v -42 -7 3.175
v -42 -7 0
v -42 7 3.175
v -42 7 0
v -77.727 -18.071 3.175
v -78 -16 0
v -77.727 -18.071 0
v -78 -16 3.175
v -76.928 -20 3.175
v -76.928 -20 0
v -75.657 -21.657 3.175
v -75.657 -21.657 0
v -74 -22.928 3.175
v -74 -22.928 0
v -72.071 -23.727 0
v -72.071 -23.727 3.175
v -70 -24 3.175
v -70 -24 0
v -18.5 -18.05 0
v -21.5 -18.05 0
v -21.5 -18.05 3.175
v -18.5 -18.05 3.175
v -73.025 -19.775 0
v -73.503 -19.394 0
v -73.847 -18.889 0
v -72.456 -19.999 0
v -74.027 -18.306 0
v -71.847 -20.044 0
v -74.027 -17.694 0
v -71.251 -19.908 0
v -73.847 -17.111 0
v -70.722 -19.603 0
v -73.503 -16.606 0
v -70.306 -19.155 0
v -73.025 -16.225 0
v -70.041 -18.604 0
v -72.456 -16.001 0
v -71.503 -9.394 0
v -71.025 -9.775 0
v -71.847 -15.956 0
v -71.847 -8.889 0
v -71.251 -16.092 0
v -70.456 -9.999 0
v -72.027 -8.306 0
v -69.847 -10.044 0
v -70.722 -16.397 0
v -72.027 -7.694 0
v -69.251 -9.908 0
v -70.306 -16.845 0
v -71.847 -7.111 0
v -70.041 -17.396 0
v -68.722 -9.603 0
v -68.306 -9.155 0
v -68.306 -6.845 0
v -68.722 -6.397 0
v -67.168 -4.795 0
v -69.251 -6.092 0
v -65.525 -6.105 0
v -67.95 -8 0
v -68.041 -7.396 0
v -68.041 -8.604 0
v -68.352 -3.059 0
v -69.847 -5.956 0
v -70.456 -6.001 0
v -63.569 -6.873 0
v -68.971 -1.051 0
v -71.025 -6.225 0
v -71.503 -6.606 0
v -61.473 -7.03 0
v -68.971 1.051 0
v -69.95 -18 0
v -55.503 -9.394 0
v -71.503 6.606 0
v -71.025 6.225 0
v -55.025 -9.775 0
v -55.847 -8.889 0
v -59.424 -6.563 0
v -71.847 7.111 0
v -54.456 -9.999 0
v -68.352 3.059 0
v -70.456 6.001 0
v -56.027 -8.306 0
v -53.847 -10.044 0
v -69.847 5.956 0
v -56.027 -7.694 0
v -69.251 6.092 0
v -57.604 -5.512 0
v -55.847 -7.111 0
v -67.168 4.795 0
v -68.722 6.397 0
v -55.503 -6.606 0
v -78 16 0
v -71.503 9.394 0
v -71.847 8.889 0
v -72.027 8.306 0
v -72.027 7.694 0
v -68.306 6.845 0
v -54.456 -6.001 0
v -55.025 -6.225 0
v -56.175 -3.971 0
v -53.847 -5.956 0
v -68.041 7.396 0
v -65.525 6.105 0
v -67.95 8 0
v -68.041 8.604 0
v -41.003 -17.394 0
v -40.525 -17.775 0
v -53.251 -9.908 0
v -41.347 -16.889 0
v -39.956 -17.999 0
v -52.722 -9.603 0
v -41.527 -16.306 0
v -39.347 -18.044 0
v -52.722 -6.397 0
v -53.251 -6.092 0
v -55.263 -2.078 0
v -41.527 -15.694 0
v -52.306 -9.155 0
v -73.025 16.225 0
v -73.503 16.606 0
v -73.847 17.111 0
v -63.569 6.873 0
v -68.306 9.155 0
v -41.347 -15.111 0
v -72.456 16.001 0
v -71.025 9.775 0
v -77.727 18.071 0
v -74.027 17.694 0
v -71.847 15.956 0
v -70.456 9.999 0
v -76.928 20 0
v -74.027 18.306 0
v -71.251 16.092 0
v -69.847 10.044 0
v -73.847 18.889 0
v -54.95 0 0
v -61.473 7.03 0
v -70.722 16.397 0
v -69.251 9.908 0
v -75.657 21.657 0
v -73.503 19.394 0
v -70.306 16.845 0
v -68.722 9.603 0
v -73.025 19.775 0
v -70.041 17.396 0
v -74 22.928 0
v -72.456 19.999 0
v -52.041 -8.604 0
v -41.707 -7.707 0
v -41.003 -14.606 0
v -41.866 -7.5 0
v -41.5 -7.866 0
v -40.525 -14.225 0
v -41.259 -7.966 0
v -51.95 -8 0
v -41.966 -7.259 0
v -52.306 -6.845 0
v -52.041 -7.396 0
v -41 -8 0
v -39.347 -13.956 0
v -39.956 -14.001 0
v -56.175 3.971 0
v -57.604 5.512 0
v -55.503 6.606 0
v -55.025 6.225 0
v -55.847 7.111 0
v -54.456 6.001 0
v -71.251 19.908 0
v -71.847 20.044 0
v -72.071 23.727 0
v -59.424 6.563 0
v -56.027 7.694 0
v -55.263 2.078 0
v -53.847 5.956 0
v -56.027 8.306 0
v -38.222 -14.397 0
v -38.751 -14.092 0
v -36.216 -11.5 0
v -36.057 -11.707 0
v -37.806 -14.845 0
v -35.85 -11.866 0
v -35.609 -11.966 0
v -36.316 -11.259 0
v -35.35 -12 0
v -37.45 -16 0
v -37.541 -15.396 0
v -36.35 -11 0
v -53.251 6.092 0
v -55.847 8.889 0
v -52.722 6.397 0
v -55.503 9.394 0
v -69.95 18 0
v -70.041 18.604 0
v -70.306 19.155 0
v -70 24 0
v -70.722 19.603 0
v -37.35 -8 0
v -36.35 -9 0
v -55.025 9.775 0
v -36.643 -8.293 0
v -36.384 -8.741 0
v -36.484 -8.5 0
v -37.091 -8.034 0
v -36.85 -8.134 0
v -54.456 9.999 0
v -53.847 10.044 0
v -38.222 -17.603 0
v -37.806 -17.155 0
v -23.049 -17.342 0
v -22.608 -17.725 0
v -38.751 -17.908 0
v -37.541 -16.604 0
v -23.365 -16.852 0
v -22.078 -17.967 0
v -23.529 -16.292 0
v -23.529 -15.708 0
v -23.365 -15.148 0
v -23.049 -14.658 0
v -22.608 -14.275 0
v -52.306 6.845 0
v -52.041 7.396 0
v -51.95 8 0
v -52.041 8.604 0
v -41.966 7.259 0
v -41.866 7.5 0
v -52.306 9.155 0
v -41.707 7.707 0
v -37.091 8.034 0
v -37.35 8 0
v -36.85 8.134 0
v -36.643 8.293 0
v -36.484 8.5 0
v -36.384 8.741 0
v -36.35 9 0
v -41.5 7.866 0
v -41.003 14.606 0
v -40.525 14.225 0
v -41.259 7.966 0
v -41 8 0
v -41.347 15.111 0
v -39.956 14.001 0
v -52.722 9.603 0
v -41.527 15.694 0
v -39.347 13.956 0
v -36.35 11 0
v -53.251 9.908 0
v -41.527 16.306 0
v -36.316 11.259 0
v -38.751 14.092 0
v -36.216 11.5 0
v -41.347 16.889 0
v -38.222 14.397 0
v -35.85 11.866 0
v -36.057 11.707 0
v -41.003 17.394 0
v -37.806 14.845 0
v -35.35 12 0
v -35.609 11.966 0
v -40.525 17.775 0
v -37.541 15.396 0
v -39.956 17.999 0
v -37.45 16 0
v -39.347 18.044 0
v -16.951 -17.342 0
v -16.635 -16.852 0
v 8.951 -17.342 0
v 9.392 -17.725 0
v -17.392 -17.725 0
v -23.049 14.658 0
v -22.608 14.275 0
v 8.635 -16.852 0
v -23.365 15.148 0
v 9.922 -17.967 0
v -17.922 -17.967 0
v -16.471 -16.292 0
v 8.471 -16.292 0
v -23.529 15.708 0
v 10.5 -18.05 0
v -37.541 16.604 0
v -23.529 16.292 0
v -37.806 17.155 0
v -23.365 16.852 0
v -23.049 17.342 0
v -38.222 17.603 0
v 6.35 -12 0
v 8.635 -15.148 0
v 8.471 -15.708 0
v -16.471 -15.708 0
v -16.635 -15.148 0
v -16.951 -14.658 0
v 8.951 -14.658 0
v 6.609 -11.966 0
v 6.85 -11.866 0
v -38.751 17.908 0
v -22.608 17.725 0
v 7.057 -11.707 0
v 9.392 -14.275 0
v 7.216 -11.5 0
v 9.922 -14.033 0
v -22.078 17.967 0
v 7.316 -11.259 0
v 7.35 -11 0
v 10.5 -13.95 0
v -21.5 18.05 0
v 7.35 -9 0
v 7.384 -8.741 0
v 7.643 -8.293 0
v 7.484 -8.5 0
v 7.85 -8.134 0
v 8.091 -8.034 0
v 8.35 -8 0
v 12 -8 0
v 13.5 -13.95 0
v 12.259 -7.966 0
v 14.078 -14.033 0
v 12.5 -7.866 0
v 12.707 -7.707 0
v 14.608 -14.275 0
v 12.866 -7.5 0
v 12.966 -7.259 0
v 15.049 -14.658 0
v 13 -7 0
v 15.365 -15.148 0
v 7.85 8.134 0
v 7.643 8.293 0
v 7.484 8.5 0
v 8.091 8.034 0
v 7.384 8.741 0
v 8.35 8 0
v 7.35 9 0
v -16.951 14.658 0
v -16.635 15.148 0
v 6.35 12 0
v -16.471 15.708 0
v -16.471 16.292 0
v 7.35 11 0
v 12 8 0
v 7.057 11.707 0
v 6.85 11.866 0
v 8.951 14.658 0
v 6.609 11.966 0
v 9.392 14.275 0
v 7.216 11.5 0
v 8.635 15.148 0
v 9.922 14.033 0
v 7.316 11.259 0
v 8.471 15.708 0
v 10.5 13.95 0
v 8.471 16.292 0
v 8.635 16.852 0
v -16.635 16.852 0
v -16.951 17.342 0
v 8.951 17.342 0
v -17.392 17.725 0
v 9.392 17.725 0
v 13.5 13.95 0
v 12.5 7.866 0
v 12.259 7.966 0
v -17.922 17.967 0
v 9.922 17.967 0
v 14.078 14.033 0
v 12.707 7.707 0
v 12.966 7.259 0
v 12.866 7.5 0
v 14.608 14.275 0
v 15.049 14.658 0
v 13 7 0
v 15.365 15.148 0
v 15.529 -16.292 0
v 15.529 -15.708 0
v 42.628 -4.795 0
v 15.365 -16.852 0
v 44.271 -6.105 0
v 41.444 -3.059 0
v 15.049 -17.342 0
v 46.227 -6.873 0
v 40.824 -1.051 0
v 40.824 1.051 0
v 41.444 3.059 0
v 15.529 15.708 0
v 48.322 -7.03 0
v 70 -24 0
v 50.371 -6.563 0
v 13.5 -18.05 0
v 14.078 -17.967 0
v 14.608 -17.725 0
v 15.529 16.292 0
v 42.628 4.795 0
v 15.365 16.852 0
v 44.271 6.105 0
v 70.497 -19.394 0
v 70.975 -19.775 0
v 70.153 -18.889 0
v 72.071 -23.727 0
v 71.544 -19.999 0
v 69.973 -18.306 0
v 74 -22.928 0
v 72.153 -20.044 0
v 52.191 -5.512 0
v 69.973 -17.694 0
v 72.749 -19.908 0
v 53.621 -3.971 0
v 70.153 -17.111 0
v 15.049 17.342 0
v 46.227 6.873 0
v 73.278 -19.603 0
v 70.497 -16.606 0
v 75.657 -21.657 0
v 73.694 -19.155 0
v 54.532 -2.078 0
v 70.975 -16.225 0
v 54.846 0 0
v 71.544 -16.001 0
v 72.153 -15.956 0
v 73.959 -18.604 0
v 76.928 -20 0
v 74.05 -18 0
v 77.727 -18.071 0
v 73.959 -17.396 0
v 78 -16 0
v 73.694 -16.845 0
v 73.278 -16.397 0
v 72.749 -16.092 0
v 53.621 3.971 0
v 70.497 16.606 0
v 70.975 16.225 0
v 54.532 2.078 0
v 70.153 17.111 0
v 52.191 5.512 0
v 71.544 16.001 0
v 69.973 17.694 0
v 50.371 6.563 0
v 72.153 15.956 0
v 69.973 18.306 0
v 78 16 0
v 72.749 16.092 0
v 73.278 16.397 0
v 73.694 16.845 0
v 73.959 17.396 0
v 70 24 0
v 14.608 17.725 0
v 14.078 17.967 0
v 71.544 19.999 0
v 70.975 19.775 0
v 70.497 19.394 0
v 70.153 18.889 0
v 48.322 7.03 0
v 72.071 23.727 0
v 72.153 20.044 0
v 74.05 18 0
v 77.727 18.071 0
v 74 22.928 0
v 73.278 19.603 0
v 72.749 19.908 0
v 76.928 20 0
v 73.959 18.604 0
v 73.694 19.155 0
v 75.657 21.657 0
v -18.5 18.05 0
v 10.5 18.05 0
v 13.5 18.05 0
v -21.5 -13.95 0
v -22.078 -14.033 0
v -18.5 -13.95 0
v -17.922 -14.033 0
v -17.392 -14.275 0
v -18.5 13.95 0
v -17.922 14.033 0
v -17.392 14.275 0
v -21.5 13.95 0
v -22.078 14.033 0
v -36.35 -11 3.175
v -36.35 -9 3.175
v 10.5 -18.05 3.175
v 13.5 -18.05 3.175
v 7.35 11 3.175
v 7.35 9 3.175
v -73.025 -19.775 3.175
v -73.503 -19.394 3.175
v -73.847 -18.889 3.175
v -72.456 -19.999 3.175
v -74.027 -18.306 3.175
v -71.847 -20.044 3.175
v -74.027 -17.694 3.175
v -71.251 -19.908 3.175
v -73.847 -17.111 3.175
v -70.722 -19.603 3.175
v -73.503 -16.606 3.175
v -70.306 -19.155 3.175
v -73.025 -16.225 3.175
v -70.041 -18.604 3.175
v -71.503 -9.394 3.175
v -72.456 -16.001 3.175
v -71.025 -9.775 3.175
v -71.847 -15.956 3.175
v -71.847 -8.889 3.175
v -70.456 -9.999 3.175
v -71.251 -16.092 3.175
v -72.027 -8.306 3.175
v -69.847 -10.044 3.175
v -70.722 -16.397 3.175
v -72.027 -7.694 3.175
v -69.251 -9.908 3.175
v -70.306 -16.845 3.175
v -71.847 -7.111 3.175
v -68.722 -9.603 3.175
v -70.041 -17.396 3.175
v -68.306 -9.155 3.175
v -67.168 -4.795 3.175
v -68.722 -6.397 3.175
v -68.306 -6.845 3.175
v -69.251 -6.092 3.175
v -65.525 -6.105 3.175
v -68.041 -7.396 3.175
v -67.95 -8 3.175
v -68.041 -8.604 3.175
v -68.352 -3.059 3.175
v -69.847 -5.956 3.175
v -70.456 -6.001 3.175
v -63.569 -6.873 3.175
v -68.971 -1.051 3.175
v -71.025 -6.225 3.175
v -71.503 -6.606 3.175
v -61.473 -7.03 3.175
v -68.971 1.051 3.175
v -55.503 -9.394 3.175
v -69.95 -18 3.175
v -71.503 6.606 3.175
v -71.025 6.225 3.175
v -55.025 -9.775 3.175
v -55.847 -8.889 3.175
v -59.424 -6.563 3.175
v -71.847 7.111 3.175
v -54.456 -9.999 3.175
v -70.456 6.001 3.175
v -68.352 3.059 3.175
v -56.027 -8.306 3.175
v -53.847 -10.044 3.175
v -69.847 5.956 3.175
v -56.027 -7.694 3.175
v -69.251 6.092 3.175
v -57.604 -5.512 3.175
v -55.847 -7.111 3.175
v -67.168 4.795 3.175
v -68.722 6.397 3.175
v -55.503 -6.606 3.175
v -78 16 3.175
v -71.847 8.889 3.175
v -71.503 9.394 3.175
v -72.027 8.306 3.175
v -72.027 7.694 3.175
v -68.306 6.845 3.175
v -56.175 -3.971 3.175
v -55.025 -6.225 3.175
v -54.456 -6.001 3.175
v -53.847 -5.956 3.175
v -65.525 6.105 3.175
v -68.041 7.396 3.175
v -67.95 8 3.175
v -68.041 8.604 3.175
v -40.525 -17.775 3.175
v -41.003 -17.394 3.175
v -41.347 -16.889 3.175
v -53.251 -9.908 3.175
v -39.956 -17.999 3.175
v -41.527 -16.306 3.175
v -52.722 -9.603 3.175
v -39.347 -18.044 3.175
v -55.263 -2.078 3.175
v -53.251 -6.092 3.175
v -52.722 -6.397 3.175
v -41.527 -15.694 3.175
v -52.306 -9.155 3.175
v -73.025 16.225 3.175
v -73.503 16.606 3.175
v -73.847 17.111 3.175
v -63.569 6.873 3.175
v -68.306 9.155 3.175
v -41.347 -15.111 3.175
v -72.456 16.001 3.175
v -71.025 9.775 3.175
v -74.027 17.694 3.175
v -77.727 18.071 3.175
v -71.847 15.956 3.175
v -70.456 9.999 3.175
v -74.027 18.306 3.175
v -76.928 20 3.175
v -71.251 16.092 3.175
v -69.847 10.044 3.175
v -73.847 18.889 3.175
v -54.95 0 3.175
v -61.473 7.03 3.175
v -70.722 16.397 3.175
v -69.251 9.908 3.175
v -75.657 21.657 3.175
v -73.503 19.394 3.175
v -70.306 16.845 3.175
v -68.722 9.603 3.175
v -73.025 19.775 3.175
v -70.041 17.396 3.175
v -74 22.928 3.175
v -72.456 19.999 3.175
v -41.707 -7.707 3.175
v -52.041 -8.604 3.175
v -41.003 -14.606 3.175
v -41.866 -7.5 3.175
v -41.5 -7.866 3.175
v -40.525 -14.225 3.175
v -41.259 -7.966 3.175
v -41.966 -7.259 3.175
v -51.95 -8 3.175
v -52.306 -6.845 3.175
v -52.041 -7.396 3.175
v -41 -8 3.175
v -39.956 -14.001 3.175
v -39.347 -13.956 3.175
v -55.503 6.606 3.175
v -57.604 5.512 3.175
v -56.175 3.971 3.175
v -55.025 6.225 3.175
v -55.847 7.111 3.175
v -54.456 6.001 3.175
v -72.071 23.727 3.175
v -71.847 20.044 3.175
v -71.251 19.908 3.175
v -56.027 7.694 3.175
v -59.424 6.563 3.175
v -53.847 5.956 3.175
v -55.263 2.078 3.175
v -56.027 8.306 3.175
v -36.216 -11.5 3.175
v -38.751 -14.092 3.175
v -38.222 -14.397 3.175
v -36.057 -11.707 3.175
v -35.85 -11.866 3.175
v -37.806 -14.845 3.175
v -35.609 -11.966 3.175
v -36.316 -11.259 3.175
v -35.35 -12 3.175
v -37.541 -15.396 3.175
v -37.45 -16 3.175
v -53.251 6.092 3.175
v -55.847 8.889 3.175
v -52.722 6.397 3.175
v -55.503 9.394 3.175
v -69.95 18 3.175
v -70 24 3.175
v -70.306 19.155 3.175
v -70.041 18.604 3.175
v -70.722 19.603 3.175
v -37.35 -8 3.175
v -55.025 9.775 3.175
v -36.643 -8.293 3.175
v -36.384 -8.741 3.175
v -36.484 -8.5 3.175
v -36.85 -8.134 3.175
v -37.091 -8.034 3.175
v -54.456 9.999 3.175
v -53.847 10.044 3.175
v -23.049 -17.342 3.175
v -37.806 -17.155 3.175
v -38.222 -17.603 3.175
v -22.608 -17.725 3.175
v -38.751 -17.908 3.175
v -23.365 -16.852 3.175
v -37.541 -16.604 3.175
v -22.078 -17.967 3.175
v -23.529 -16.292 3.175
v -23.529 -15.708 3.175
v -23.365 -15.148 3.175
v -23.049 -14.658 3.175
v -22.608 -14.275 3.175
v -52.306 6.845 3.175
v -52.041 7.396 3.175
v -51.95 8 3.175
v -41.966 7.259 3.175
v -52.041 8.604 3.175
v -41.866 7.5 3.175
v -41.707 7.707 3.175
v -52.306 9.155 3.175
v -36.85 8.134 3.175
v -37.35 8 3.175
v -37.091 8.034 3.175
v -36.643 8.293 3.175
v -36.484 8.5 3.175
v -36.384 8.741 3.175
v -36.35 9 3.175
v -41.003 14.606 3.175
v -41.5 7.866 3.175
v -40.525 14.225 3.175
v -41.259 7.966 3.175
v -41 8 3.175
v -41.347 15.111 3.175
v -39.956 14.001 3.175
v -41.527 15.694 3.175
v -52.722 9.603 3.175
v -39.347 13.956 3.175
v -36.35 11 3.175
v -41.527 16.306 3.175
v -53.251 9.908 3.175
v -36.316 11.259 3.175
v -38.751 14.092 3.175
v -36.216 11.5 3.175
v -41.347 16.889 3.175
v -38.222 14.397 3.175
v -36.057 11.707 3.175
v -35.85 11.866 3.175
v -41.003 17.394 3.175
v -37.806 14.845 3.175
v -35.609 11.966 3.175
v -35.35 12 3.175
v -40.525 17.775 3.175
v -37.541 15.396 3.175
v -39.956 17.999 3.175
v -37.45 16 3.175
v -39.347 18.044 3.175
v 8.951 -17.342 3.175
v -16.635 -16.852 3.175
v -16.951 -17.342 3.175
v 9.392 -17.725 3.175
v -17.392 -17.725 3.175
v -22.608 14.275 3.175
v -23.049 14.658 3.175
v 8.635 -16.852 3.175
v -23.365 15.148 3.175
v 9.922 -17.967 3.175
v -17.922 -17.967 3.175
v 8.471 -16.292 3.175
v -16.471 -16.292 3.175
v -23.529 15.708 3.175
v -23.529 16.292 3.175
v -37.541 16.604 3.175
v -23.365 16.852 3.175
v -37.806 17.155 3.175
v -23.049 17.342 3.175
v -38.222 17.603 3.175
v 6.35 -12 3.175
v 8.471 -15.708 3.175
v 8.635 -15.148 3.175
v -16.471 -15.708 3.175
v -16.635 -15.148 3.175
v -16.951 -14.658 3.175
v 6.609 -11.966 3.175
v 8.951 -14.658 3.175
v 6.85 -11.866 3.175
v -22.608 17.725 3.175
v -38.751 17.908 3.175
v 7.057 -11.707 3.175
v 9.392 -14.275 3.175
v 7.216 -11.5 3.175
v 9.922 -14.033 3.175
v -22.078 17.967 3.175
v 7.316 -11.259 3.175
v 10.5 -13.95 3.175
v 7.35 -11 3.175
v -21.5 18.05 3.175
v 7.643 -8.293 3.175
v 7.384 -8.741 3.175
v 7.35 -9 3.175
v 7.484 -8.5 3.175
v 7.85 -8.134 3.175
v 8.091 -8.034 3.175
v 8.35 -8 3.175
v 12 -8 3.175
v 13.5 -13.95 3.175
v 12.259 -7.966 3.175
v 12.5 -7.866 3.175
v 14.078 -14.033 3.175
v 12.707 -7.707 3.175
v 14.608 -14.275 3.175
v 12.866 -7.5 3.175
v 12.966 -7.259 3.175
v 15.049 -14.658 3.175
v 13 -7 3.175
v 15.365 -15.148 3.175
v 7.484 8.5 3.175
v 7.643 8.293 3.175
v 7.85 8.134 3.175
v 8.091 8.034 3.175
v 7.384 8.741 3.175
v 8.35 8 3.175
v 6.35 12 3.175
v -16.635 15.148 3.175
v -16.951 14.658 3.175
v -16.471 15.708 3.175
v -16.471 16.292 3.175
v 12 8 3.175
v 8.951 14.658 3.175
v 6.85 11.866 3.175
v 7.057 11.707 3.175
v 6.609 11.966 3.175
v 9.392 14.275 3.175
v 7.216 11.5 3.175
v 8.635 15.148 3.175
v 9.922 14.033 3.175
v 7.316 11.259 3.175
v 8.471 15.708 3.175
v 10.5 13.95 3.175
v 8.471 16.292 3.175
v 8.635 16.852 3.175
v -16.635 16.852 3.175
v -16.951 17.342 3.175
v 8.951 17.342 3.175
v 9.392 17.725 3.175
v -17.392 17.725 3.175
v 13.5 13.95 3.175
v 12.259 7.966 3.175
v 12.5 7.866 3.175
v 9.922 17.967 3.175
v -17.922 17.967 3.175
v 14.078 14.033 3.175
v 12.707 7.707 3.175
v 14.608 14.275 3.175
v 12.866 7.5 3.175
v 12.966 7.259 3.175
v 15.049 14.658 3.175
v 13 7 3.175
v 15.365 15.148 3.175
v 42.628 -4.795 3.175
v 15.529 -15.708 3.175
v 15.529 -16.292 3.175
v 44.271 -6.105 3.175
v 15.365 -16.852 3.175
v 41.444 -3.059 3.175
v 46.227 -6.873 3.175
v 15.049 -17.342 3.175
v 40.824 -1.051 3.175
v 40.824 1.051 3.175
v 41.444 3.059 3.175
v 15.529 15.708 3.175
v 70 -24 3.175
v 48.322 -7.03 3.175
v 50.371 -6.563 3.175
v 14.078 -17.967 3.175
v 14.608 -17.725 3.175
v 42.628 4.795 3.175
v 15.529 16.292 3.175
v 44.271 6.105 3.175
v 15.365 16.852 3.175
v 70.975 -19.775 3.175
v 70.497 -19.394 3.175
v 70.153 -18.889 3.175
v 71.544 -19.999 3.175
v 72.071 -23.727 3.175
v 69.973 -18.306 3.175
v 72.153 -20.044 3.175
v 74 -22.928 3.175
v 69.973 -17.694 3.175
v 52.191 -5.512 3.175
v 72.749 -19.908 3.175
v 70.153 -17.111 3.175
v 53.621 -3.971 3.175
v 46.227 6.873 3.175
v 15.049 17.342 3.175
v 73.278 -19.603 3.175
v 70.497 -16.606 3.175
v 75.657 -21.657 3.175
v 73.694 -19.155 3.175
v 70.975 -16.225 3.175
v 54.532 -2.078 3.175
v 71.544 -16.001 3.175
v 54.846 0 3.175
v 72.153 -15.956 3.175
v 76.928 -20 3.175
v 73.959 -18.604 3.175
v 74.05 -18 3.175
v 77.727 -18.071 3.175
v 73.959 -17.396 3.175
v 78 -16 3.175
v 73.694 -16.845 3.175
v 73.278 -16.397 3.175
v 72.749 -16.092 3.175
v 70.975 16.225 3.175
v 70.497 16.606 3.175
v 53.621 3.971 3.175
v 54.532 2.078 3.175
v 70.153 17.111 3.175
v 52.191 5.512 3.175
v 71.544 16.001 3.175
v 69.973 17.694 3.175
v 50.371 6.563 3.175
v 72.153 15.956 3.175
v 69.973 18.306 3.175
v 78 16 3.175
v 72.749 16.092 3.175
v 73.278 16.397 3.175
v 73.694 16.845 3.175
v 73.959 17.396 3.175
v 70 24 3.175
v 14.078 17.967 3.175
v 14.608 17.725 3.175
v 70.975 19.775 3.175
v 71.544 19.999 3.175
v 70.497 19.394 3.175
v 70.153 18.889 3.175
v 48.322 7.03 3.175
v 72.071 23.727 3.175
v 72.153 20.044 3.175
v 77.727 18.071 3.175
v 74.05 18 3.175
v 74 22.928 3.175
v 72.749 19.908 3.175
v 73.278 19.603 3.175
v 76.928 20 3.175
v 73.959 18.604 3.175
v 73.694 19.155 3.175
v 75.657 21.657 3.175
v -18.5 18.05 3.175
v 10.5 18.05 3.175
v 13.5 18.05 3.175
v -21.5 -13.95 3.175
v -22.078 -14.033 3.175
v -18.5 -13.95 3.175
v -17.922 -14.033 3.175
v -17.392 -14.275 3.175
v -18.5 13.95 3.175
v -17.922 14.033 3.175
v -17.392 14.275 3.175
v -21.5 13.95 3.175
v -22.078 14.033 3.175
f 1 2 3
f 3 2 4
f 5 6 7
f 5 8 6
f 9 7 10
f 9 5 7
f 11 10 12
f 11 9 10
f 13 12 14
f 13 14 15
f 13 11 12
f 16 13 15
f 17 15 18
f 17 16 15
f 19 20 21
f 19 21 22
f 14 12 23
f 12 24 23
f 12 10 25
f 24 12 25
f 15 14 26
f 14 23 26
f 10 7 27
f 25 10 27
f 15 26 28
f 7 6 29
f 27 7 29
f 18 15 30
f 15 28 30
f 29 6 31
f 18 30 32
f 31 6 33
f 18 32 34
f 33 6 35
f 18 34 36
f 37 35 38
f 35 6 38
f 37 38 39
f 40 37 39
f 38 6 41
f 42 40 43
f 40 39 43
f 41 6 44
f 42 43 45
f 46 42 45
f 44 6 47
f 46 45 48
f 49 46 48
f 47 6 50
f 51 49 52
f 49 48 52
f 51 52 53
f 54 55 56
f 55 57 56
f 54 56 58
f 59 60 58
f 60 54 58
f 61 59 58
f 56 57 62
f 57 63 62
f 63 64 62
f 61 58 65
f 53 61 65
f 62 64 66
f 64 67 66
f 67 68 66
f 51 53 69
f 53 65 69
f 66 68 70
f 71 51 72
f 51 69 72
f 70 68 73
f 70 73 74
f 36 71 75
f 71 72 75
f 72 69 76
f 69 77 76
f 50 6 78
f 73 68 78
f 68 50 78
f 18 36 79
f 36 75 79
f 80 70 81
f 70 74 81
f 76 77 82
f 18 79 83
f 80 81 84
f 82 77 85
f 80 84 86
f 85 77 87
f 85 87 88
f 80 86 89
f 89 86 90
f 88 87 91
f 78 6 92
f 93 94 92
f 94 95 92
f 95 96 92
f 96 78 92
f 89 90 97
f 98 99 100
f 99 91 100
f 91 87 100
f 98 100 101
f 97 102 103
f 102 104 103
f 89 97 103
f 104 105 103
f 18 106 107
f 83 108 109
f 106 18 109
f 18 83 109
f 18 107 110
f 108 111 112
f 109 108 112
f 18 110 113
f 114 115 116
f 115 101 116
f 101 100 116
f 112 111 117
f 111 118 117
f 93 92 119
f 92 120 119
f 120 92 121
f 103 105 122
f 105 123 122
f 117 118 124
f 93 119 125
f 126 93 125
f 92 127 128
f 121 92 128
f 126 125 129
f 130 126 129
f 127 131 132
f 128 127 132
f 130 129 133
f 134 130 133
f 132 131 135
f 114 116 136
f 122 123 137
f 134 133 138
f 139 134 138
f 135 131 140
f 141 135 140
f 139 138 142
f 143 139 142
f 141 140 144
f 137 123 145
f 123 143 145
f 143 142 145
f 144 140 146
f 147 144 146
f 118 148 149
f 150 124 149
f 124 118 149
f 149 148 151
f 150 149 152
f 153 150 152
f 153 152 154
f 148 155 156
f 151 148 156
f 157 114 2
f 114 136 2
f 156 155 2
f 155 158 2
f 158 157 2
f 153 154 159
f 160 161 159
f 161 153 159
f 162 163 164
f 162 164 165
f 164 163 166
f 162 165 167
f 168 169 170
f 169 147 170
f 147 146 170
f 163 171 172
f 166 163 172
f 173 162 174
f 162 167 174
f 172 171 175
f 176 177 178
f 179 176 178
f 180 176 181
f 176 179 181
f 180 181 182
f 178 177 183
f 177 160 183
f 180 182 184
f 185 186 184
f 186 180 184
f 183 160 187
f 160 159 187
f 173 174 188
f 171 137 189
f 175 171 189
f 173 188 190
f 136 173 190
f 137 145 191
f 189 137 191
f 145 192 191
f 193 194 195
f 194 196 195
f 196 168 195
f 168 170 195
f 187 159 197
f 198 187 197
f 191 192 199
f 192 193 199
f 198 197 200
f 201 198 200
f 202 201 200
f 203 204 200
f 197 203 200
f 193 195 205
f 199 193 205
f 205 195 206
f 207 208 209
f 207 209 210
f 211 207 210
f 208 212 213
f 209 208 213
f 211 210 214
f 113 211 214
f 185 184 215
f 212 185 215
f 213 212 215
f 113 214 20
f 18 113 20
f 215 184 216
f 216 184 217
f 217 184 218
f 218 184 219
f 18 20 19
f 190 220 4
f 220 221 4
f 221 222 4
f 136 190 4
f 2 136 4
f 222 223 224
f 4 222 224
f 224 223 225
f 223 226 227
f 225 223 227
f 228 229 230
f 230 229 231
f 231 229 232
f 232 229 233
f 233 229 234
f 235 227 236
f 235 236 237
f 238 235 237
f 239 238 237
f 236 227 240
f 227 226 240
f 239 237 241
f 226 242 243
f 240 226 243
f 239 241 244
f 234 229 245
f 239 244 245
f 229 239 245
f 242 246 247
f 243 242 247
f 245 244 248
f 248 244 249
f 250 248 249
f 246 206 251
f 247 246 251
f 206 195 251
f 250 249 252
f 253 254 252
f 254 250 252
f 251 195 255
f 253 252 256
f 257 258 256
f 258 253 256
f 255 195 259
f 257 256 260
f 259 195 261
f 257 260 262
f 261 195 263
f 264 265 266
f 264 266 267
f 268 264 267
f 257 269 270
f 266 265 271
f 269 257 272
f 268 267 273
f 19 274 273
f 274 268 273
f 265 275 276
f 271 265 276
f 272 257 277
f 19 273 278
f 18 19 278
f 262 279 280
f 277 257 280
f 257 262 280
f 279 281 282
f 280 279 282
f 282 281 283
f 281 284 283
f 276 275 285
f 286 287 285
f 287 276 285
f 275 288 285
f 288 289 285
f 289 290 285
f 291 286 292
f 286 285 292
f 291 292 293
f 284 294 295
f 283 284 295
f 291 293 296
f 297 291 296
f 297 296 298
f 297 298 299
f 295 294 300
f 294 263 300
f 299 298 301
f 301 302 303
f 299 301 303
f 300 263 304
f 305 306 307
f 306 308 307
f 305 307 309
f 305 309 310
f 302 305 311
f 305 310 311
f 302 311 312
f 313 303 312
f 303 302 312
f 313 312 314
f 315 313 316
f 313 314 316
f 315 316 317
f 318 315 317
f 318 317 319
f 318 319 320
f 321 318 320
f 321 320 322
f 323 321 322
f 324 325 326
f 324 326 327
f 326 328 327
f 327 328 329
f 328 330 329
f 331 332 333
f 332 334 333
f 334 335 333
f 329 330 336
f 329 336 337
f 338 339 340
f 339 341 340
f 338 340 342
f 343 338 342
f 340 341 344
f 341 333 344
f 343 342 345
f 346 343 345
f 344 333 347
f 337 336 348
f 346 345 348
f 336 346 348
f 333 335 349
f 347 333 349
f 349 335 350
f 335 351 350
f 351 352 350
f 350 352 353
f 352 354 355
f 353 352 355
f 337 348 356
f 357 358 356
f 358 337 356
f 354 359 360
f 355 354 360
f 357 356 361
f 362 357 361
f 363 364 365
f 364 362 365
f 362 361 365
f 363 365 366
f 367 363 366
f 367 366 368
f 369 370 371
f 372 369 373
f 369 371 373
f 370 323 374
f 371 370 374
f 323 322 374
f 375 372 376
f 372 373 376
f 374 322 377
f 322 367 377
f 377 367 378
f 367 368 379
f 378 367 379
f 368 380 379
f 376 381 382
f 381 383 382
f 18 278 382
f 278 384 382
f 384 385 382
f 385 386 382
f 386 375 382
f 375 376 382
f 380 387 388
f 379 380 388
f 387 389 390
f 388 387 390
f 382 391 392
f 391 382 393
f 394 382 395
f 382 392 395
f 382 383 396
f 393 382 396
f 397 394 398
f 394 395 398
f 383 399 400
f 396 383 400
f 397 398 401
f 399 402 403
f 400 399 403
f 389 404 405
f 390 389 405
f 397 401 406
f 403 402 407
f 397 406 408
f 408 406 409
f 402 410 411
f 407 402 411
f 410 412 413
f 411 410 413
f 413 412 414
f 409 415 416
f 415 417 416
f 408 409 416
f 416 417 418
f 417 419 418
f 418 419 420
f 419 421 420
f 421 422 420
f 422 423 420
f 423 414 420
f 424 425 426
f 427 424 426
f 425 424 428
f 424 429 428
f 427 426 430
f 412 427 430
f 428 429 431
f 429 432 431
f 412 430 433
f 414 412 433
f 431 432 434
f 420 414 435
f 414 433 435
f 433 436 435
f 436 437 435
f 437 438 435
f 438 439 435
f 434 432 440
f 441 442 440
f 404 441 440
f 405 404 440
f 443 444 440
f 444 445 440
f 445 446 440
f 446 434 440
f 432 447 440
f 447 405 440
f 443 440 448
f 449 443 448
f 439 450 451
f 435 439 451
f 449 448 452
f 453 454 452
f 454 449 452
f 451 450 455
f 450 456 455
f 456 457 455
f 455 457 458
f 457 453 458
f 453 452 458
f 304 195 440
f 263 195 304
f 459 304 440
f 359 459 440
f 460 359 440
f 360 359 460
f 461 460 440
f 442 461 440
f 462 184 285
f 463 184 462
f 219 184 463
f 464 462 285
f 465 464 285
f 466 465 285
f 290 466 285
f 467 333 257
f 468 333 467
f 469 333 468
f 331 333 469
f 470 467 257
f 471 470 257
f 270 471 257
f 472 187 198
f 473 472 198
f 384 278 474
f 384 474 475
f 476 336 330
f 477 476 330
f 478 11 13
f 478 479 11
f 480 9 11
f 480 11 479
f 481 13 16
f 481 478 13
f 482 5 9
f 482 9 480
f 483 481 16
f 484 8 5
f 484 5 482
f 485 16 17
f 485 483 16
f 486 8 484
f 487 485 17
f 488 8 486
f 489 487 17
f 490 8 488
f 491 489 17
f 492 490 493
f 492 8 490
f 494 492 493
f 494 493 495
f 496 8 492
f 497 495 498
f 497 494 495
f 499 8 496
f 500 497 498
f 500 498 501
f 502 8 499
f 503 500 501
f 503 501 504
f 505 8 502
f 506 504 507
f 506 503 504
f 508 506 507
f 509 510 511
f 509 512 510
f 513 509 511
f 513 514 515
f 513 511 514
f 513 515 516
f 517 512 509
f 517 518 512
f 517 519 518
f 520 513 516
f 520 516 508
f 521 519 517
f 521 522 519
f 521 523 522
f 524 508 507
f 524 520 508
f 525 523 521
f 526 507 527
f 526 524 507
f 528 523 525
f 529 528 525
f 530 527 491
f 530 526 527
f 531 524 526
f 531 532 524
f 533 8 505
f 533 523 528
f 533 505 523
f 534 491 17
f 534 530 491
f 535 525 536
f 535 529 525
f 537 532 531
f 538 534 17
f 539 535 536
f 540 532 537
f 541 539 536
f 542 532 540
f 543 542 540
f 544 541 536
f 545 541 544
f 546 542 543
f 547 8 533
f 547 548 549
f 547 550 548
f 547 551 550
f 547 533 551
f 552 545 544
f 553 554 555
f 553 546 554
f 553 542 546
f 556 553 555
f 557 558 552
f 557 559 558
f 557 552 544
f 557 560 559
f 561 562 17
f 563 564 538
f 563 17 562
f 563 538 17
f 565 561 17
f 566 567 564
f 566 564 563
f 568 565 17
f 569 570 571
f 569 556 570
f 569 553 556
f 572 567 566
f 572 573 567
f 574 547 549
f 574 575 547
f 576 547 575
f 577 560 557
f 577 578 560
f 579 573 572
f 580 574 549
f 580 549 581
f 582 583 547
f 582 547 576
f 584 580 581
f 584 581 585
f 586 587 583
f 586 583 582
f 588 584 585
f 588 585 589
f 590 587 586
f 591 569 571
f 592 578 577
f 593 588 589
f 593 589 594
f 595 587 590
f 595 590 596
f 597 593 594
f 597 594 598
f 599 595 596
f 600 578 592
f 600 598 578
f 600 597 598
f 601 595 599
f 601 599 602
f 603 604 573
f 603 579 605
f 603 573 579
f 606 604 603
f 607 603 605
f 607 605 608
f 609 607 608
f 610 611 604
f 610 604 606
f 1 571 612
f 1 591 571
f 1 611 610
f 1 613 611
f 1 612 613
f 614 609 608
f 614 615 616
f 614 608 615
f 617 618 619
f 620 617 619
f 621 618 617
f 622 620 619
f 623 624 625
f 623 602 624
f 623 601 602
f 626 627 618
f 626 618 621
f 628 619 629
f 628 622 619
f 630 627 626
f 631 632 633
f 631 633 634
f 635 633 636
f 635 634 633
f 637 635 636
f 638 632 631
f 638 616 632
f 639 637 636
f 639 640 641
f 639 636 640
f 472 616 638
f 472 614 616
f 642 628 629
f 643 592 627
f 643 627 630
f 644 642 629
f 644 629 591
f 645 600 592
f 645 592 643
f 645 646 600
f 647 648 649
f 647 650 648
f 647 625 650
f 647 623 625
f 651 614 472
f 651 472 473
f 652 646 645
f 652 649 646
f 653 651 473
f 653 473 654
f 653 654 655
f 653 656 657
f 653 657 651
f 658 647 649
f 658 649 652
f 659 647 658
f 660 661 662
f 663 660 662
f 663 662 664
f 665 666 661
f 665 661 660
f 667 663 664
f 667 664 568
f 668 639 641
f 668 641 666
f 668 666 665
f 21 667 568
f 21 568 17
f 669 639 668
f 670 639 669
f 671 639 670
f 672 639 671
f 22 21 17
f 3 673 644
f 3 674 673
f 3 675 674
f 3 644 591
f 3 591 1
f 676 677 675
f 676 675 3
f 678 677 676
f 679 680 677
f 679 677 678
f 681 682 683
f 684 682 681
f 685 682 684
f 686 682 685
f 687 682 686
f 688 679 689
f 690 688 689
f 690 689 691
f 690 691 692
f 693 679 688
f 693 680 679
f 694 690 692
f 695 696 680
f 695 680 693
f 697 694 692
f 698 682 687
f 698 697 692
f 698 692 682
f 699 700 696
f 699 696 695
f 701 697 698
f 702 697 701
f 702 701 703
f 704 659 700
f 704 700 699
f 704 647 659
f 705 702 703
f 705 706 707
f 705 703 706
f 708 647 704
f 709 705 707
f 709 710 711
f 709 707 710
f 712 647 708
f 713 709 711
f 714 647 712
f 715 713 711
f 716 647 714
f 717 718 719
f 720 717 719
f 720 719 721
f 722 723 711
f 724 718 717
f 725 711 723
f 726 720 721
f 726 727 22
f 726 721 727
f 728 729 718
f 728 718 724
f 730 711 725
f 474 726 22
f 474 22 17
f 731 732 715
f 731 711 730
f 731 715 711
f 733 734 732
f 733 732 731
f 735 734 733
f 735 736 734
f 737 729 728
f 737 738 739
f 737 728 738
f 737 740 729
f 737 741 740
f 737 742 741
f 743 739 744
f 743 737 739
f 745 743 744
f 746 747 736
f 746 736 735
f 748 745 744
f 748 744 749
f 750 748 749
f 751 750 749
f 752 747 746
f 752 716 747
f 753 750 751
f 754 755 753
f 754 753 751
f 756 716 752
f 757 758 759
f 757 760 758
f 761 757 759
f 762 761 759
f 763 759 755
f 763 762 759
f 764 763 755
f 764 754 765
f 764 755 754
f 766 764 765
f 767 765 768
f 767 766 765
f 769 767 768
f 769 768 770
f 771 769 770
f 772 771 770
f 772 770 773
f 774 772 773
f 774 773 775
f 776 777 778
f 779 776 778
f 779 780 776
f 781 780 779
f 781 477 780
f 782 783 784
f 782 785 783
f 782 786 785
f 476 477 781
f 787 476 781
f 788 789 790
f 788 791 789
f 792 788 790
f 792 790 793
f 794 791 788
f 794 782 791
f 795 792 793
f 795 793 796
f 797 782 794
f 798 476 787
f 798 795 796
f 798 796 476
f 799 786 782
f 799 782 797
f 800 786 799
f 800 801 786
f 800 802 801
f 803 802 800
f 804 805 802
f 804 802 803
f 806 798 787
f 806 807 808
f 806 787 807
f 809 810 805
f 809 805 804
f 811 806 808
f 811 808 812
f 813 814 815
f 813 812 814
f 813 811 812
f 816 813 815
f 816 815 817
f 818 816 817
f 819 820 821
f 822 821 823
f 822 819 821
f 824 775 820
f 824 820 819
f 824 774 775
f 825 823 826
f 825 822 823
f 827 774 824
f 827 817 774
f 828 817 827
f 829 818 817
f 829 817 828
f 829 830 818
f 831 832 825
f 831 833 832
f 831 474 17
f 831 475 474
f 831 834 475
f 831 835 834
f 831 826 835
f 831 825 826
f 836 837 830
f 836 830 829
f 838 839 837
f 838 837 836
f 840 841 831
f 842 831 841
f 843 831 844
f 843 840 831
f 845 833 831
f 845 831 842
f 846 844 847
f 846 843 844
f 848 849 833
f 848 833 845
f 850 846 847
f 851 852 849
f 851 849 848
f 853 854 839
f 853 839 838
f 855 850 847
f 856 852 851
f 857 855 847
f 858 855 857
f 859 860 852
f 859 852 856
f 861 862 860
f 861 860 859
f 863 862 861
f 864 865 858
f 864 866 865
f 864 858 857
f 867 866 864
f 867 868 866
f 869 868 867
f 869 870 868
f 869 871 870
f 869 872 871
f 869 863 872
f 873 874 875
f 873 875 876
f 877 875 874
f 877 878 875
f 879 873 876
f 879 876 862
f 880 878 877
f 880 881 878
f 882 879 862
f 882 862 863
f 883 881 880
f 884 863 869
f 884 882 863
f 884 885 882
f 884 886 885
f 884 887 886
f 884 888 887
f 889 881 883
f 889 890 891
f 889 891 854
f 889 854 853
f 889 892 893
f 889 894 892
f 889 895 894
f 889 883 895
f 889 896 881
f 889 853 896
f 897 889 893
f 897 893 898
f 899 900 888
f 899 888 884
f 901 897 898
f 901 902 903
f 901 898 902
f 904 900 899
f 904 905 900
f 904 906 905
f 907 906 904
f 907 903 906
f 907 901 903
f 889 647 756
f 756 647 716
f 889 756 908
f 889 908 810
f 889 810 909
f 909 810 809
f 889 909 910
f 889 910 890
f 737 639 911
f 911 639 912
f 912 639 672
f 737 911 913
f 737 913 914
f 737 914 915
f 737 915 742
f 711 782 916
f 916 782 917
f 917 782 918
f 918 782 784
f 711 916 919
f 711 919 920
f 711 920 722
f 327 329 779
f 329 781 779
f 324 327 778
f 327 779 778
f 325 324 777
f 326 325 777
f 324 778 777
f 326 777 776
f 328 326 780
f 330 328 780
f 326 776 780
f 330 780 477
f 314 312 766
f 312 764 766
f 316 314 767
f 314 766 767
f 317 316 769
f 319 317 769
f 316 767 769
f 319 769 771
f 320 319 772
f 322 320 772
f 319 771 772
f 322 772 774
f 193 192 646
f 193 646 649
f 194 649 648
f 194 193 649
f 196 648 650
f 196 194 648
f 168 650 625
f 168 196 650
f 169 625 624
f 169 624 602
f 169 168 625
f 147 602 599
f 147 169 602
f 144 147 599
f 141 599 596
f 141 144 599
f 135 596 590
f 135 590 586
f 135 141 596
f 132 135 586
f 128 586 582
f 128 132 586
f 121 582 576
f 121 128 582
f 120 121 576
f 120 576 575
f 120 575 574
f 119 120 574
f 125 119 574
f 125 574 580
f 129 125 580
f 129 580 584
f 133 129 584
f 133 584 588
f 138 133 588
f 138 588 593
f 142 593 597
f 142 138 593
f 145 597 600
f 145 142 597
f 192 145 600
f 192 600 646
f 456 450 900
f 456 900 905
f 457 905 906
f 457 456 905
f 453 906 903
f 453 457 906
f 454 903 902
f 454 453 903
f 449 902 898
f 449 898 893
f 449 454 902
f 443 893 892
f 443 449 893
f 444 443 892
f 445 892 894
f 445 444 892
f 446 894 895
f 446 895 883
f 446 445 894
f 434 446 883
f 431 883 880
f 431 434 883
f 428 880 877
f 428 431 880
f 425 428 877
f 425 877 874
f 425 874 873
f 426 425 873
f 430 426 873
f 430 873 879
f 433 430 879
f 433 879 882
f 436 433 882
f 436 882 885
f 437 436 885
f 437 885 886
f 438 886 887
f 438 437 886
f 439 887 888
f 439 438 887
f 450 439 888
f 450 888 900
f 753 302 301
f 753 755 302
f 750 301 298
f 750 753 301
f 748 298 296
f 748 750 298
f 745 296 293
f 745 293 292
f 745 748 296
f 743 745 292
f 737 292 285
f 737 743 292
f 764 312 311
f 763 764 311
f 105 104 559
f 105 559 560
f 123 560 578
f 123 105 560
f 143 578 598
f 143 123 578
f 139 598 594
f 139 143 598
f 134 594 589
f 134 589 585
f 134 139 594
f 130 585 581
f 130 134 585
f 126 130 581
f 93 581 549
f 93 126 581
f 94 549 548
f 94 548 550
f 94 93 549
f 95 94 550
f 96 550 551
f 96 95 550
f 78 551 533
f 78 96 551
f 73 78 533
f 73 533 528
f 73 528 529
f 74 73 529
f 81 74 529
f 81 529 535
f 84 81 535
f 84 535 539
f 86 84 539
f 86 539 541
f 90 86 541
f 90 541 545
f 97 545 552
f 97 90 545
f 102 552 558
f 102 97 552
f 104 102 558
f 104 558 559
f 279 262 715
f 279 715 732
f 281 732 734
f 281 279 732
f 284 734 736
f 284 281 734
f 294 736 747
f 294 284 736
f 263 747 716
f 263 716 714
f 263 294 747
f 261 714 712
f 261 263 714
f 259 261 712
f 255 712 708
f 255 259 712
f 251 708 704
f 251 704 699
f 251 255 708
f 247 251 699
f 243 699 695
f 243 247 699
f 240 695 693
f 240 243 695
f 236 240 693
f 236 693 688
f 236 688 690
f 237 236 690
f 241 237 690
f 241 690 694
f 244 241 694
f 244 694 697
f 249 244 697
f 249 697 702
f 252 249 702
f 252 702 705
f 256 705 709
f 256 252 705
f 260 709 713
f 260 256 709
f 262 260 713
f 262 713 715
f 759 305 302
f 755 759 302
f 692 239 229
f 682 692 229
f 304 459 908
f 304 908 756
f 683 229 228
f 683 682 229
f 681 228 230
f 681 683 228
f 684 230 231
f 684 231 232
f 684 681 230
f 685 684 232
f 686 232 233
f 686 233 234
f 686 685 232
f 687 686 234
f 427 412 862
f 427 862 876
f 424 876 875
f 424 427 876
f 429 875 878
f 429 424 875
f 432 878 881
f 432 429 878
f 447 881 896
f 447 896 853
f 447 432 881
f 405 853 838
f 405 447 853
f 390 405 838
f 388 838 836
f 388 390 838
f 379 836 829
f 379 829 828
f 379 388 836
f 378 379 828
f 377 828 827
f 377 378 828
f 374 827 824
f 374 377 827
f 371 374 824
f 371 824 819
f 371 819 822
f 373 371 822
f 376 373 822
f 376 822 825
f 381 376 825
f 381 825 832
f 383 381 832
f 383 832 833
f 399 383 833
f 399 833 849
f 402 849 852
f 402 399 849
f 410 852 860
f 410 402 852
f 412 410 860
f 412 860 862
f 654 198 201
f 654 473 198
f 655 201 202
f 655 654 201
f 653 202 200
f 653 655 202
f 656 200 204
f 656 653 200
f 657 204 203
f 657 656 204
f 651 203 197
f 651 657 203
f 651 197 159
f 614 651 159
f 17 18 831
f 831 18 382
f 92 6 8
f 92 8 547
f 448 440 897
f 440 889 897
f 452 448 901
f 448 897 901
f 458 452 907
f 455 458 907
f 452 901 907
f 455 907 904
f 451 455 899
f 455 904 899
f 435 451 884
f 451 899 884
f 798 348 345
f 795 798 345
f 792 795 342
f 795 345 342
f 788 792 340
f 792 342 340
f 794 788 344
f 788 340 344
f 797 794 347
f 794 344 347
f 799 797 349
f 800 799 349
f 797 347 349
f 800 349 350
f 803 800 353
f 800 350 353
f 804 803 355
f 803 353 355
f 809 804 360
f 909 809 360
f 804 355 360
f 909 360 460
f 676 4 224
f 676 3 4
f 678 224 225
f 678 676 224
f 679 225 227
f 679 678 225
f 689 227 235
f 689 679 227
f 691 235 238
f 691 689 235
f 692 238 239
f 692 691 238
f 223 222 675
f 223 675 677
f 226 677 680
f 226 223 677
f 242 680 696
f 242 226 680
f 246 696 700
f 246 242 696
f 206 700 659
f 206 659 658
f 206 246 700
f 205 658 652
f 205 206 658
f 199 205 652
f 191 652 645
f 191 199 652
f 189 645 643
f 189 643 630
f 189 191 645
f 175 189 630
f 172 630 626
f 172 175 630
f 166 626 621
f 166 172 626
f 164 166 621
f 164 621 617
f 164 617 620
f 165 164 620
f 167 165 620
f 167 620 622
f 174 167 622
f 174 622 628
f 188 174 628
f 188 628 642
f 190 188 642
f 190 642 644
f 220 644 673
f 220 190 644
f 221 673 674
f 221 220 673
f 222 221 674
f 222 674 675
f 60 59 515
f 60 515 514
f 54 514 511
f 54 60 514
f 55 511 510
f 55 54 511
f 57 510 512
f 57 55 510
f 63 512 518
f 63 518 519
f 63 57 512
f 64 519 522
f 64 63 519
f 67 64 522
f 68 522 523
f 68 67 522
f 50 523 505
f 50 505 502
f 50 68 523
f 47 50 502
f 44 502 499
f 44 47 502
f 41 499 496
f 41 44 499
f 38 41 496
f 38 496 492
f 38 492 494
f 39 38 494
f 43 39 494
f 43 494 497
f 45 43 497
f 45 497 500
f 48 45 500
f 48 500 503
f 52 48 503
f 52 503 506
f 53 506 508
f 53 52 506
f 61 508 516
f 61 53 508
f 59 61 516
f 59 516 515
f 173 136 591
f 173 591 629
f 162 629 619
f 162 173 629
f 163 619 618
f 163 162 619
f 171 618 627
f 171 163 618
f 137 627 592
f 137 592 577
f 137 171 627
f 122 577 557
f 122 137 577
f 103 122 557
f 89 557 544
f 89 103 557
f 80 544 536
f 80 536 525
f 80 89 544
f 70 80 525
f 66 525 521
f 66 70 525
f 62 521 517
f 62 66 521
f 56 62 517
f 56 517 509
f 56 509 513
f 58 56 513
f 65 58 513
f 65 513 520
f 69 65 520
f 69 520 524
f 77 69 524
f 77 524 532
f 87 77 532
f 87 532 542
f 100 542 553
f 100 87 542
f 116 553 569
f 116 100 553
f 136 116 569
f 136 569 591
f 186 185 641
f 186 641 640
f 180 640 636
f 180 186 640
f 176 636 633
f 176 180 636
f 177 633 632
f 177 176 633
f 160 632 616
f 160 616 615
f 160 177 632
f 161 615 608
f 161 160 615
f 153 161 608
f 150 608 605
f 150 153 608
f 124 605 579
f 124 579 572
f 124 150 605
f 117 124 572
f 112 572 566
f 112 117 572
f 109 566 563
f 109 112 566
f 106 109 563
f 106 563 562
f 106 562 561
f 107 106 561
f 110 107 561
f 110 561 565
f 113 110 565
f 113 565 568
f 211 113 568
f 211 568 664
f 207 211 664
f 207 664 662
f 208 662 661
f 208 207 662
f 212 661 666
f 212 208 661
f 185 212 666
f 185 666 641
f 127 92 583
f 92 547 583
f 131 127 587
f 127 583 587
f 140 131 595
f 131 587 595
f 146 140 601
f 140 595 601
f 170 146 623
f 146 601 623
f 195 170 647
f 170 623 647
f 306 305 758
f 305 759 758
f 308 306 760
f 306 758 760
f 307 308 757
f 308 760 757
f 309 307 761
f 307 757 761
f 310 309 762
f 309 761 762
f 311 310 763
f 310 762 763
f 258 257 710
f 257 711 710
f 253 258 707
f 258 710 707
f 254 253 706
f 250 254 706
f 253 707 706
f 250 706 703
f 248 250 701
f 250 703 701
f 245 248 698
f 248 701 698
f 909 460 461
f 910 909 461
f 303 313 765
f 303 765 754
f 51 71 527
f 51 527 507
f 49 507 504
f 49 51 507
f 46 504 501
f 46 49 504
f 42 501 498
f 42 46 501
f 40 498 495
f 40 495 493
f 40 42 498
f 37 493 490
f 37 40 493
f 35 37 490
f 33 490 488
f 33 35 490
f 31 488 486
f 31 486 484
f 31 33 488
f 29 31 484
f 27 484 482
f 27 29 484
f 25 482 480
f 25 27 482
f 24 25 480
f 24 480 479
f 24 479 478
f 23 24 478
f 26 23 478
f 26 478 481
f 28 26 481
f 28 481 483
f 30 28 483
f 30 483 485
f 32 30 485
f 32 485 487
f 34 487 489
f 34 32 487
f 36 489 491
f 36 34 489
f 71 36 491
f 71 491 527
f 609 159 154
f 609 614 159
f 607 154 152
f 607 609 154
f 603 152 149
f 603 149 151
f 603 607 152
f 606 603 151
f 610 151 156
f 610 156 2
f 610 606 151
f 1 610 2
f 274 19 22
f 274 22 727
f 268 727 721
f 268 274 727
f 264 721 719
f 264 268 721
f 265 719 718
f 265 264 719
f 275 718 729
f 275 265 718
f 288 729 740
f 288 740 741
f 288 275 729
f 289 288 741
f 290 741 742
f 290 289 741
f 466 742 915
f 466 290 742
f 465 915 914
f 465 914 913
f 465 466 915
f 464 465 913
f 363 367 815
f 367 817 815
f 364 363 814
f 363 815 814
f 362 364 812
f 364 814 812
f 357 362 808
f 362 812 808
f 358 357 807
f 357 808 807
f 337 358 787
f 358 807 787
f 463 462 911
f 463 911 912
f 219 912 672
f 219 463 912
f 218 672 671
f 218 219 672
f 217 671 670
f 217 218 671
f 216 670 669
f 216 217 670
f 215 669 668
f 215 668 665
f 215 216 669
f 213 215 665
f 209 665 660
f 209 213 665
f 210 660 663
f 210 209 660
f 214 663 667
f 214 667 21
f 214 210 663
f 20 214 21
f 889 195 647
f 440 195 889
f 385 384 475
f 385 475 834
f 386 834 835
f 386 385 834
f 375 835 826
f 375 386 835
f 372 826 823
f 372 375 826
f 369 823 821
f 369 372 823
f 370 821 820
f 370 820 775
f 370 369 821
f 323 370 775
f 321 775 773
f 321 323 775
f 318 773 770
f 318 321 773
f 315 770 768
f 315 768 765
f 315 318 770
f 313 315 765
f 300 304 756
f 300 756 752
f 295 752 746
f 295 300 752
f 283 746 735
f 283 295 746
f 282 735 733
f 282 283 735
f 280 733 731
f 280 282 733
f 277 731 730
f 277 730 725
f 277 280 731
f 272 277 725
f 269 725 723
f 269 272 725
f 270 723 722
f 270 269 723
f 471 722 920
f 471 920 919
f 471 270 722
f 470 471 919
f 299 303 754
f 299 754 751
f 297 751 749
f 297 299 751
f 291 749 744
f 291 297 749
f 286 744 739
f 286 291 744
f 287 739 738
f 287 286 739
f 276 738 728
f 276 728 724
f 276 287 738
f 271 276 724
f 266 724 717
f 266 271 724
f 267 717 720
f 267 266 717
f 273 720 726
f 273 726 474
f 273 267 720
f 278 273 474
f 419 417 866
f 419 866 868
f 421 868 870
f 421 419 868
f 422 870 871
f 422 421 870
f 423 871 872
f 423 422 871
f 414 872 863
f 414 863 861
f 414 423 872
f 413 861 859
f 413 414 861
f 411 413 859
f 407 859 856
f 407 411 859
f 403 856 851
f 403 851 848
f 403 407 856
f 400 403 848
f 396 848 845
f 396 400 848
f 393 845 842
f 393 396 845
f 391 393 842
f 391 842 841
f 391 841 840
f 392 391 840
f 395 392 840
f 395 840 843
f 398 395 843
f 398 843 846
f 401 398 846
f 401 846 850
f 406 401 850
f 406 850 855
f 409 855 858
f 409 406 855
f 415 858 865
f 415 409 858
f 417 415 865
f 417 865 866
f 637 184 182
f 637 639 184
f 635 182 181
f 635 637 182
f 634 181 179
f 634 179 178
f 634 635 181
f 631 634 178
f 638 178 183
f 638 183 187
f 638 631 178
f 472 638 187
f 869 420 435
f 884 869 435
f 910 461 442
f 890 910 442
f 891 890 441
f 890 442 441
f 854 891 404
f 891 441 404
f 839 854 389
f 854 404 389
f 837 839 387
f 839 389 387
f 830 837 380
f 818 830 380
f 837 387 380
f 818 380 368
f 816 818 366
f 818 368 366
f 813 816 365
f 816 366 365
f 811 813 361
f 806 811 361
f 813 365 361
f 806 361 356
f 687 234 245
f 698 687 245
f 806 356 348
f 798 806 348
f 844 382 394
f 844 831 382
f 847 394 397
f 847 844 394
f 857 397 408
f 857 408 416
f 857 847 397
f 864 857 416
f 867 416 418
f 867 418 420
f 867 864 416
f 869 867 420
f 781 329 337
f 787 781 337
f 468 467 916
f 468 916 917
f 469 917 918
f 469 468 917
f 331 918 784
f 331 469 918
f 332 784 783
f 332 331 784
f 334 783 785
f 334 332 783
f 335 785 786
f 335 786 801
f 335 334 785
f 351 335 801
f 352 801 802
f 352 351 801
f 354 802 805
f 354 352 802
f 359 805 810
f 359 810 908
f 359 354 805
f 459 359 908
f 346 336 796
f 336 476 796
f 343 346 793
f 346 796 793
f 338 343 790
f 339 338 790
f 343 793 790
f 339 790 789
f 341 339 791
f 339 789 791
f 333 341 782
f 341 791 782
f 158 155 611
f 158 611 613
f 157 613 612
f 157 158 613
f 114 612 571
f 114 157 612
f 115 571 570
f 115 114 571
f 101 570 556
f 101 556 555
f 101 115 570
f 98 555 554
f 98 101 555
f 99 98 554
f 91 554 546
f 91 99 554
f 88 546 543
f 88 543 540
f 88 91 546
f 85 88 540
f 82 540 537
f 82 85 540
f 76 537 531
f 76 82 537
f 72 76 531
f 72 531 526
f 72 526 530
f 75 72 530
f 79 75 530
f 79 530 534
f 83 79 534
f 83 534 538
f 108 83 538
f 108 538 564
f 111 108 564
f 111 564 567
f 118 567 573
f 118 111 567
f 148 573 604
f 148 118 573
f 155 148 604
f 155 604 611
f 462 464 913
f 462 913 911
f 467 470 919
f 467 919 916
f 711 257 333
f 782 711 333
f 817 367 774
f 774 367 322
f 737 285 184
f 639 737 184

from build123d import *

# Parameters (mm, degrees)
SKETCH2_W           = 156
SKETCH2_H           = 48
SKETCH2_R           = 2.05
SKETCH2_R_2         = 7.05
BOSS_EXTRUDE2_DEPTH = 3.175
FILLET1_R           = 8
FILLET2_R           = 1


with BuildPart() as part:
    # Sketch2 → Boss-Extrude2 (new body)
    with BuildSketch(Plane.XY):
        Rectangle(SKETCH2_W, SKETCH2_H)
        with Locations((-70, 8)):
            Circle(SKETCH2_R, mode=Mode.SUBTRACT)
        with Locations((-54, 8)):
            Circle(SKETCH2_R, mode=Mode.SUBTRACT)
        with Locations((-54, -8)):
            Circle(SKETCH2_R, mode=Mode.SUBTRACT)
        with Locations((-70, -8)):
            Circle(SKETCH2_R, mode=Mode.SUBTRACT)
        with Locations((-39.5, 16)):
            Circle(SKETCH2_R, mode=Mode.SUBTRACT)
        with Locations((-39.5, -16)):
            Circle(SKETCH2_R, mode=Mode.SUBTRACT)
        with Locations((47.795580316, 0)):
            Circle(SKETCH2_R_2, mode=Mode.SUBTRACT)
        with Locations((-62, 0)):
            Circle(SKETCH2_R_2, mode=Mode.SUBTRACT)
        with Locations((72, 18)):
            Circle(SKETCH2_R, mode=Mode.SUBTRACT)
        with Locations((72, -18)):
            Circle(SKETCH2_R, mode=Mode.SUBTRACT)
        with Locations((-72, -18)):
            Circle(SKETCH2_R, mode=Mode.SUBTRACT)
        with Locations((-72, 18)):
            Circle(SKETCH2_R, mode=Mode.SUBTRACT)
        Polygon((7.35, -12), (-36.35, -12), (-36.35, -8), (-42, -8), (-42, 8), (-36.35, 8), (-36.35, 12), (7.35, 12), (7.35, 8), (13, 8), (13, -8), (7.35, -8), align=None, mode=Mode.SUBTRACT)
        with BuildLine():
            Line((10.5, 18.05), (13.5, 18.05))
            ThreePointArc((13.5, 18.05), (15.55, 16), (13.5, 13.95))
            Line((13.5, 13.95), (10.5, 13.95))
            ThreePointArc((10.5, 13.95), (8.45, 16), (10.5, 18.05))
        make_face(mode=Mode.SUBTRACT)
        with BuildLine():
            Line((-21.5, 13.95), (-18.5, 13.95))
            ThreePointArc((-18.5, 13.95), (-16.45, 16), (-18.5, 18.05))
            Line((-18.5, 18.05), (-21.5, 18.05))
            ThreePointArc((-21.5, 18.05), (-23.55, 16), (-21.5, 13.95))
        make_face(mode=Mode.SUBTRACT)
        with BuildLine():
            Line((-21.5, -18.05), (-18.5, -18.05))
            ThreePointArc((-18.5, -18.05), (-16.45, -16), (-18.5, -13.95))
            Line((-18.5, -13.95), (-21.5, -13.95))
            ThreePointArc((-21.5, -13.95), (-23.55, -16), (-21.5, -18.05))
        make_face(mode=Mode.SUBTRACT)
        with BuildLine():
            Line((10.5, -18.05), (13.5, -18.05))
            ThreePointArc((13.5, -18.05), (15.55, -16), (13.5, -13.95))
            Line((13.5, -13.95), (10.5, -13.95))
            ThreePointArc((10.5, -13.95), (8.45, -16), (10.5, -18.05))
        make_face(mode=Mode.SUBTRACT)
    extrude(amount=BOSS_EXTRUDE2_DEPTH)

    # Fillet1
    fillet1_edges = [part.edges().sort_by_distance(p)[0] for p in [
        (78, 24, 1.5875),
        (78, -24, 1.5875),
        (-78, -24, 1.5875),
        (-78, 24, 1.5875),
    ]]
    fillet(fillet1_edges, radius=FILLET1_R)

    # Fillet2
    fillet2_edges = [part.edges().sort_by_distance(p)[0] for p in [
        (7.35, 12, 1.5875),
        (-36.35, 12, 1.5875),
        (-36.35, 8, 1.5875),
        (-42, 8, 1.5875),
        (-42, -8, 1.5875),
        (-36.35, -8, 1.5875),
        (-36.35, -12, 1.5875),
        (7.35, -12, 1.5875),
        (7.35, -8, 1.5875),
        (13, -8, 1.5875),
        (13, 8, 1.5875),
        (7.35, 8, 1.5875),
    ]]
    fillet(fillet2_edges, radius=FILLET2_R)


solid = part.part
